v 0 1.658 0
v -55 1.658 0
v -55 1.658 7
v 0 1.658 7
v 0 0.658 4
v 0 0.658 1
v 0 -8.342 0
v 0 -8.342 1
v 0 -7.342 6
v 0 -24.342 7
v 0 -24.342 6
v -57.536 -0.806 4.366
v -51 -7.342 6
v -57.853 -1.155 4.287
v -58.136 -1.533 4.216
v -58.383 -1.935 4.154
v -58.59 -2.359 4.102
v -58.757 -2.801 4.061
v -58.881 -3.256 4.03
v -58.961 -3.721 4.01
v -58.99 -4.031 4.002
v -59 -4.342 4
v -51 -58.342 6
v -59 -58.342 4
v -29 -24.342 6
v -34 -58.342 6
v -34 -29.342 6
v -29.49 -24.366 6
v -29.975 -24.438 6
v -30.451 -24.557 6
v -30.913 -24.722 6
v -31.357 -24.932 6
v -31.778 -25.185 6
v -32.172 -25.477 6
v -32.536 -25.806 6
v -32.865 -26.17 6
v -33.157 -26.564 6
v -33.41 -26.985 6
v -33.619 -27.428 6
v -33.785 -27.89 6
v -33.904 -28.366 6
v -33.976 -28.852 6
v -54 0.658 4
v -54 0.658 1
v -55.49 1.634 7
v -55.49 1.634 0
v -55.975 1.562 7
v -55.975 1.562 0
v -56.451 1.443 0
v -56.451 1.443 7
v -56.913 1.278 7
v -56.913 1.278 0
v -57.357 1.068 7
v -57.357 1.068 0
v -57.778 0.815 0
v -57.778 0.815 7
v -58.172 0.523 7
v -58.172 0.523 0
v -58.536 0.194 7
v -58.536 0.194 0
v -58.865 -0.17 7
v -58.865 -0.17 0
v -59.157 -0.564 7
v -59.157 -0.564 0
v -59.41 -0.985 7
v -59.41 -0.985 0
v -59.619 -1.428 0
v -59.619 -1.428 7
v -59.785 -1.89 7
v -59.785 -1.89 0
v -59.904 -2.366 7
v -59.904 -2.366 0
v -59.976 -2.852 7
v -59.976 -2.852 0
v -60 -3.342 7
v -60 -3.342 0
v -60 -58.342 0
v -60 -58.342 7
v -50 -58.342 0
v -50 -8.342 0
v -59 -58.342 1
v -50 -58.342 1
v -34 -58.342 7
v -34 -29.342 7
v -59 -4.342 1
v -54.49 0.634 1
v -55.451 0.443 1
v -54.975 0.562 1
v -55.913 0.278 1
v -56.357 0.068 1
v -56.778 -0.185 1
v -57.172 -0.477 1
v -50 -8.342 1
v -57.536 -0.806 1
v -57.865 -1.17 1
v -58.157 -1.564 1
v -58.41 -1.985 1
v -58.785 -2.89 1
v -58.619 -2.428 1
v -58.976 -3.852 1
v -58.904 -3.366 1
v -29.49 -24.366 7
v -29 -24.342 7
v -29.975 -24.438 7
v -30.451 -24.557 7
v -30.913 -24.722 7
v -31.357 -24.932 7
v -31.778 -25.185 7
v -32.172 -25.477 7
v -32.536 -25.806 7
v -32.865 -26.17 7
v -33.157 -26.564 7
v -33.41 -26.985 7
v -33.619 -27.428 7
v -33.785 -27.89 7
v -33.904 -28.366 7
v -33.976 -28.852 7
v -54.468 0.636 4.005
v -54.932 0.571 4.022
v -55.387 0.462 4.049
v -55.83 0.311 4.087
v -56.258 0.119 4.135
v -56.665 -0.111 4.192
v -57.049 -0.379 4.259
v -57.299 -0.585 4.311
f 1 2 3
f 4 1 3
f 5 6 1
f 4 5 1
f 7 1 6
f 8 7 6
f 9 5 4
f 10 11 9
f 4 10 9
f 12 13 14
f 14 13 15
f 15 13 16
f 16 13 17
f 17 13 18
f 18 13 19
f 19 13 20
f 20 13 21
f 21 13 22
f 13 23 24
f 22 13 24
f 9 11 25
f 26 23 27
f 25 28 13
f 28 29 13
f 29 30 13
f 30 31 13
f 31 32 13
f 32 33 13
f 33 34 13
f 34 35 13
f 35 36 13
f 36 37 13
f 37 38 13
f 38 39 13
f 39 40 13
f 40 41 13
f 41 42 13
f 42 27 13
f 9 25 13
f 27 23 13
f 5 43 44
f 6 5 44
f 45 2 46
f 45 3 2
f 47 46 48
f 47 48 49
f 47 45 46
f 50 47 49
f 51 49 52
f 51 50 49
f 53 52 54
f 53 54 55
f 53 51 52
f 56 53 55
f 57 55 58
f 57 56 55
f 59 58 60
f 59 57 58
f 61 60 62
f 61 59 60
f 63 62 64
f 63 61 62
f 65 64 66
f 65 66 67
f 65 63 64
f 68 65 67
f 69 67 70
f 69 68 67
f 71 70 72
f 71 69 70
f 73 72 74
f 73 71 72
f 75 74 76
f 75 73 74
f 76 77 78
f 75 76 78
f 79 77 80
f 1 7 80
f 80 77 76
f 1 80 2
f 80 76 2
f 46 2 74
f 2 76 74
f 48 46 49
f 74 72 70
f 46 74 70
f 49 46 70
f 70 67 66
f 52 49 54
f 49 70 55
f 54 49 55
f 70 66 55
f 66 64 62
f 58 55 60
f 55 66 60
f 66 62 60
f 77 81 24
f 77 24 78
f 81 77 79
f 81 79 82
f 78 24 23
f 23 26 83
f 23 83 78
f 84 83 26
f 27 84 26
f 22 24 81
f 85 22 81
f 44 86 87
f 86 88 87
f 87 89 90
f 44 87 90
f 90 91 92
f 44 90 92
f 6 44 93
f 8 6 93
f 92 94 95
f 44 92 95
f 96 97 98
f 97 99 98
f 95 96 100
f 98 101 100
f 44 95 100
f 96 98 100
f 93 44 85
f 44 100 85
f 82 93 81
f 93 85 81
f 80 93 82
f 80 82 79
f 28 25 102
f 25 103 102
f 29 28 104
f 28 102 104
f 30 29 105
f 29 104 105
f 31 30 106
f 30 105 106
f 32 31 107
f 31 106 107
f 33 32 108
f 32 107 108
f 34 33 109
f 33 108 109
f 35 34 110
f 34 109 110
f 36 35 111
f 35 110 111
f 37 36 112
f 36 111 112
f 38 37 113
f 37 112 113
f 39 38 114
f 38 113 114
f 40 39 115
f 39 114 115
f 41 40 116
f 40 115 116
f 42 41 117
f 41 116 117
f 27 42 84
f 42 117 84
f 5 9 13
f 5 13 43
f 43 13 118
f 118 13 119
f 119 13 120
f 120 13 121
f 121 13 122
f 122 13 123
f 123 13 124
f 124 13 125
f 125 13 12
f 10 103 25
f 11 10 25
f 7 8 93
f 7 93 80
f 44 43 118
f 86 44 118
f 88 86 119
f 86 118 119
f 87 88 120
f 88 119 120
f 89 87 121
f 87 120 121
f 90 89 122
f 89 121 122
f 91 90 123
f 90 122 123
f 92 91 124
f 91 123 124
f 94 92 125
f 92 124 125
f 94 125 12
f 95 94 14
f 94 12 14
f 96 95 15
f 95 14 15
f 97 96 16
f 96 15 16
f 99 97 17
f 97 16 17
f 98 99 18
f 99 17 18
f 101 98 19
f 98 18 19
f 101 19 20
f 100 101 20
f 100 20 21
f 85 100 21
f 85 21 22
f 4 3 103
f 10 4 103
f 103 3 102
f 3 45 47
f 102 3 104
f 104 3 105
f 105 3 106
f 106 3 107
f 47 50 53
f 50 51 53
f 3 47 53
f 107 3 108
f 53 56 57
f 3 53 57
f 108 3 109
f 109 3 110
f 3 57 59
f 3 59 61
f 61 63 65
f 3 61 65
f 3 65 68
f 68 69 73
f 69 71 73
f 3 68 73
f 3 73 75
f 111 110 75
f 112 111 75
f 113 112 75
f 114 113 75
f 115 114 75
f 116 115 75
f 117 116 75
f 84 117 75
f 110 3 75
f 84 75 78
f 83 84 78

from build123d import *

# Parameters (mm, degrees)
F3_R = 5
F4_R = 5


with BuildPart() as f2:
    # F2: sweep along a path in F1
    with BuildLine(Plane.XY) as f2_path:
        Line((0, 1.6581159234), (-60, 1.6581159234))
        Line((-60, 1.6581159234), (-60, -58.3418840766))
    # F0 (on Right) → F2 (sweep)
    with BuildSketch(Plane.YZ):
        Polygon((1.6581159234, 7), (-24.3418840766, 7), (-24.3418840766, 6), (-7.3418840766, 6), (0.6581159234, 4), (0.6581159234, 1), (-8.3418840766, 1), (-8.3418840766, 0), (1.6581159234, 0), align=None)
    sweep(path=f2_path.line, transition=Transition.RIGHT)

    # F3
    f3_edges = [f2.edges().sort_by_distance(p)[0] for p in [
        (-59, 0.658116, 2.5),
    ]]
    fillet(f3_edges, radius=F3_R)

    # F4
    f4_edges = [f2.edges().sort_by_distance(p)[0] for p in [
        (-34, -24.341884, 6.5),
        (-60, 1.658116, 3.5),
    ]]
    fillet(f4_edges, radius=F4_R)


solid = f2.part
